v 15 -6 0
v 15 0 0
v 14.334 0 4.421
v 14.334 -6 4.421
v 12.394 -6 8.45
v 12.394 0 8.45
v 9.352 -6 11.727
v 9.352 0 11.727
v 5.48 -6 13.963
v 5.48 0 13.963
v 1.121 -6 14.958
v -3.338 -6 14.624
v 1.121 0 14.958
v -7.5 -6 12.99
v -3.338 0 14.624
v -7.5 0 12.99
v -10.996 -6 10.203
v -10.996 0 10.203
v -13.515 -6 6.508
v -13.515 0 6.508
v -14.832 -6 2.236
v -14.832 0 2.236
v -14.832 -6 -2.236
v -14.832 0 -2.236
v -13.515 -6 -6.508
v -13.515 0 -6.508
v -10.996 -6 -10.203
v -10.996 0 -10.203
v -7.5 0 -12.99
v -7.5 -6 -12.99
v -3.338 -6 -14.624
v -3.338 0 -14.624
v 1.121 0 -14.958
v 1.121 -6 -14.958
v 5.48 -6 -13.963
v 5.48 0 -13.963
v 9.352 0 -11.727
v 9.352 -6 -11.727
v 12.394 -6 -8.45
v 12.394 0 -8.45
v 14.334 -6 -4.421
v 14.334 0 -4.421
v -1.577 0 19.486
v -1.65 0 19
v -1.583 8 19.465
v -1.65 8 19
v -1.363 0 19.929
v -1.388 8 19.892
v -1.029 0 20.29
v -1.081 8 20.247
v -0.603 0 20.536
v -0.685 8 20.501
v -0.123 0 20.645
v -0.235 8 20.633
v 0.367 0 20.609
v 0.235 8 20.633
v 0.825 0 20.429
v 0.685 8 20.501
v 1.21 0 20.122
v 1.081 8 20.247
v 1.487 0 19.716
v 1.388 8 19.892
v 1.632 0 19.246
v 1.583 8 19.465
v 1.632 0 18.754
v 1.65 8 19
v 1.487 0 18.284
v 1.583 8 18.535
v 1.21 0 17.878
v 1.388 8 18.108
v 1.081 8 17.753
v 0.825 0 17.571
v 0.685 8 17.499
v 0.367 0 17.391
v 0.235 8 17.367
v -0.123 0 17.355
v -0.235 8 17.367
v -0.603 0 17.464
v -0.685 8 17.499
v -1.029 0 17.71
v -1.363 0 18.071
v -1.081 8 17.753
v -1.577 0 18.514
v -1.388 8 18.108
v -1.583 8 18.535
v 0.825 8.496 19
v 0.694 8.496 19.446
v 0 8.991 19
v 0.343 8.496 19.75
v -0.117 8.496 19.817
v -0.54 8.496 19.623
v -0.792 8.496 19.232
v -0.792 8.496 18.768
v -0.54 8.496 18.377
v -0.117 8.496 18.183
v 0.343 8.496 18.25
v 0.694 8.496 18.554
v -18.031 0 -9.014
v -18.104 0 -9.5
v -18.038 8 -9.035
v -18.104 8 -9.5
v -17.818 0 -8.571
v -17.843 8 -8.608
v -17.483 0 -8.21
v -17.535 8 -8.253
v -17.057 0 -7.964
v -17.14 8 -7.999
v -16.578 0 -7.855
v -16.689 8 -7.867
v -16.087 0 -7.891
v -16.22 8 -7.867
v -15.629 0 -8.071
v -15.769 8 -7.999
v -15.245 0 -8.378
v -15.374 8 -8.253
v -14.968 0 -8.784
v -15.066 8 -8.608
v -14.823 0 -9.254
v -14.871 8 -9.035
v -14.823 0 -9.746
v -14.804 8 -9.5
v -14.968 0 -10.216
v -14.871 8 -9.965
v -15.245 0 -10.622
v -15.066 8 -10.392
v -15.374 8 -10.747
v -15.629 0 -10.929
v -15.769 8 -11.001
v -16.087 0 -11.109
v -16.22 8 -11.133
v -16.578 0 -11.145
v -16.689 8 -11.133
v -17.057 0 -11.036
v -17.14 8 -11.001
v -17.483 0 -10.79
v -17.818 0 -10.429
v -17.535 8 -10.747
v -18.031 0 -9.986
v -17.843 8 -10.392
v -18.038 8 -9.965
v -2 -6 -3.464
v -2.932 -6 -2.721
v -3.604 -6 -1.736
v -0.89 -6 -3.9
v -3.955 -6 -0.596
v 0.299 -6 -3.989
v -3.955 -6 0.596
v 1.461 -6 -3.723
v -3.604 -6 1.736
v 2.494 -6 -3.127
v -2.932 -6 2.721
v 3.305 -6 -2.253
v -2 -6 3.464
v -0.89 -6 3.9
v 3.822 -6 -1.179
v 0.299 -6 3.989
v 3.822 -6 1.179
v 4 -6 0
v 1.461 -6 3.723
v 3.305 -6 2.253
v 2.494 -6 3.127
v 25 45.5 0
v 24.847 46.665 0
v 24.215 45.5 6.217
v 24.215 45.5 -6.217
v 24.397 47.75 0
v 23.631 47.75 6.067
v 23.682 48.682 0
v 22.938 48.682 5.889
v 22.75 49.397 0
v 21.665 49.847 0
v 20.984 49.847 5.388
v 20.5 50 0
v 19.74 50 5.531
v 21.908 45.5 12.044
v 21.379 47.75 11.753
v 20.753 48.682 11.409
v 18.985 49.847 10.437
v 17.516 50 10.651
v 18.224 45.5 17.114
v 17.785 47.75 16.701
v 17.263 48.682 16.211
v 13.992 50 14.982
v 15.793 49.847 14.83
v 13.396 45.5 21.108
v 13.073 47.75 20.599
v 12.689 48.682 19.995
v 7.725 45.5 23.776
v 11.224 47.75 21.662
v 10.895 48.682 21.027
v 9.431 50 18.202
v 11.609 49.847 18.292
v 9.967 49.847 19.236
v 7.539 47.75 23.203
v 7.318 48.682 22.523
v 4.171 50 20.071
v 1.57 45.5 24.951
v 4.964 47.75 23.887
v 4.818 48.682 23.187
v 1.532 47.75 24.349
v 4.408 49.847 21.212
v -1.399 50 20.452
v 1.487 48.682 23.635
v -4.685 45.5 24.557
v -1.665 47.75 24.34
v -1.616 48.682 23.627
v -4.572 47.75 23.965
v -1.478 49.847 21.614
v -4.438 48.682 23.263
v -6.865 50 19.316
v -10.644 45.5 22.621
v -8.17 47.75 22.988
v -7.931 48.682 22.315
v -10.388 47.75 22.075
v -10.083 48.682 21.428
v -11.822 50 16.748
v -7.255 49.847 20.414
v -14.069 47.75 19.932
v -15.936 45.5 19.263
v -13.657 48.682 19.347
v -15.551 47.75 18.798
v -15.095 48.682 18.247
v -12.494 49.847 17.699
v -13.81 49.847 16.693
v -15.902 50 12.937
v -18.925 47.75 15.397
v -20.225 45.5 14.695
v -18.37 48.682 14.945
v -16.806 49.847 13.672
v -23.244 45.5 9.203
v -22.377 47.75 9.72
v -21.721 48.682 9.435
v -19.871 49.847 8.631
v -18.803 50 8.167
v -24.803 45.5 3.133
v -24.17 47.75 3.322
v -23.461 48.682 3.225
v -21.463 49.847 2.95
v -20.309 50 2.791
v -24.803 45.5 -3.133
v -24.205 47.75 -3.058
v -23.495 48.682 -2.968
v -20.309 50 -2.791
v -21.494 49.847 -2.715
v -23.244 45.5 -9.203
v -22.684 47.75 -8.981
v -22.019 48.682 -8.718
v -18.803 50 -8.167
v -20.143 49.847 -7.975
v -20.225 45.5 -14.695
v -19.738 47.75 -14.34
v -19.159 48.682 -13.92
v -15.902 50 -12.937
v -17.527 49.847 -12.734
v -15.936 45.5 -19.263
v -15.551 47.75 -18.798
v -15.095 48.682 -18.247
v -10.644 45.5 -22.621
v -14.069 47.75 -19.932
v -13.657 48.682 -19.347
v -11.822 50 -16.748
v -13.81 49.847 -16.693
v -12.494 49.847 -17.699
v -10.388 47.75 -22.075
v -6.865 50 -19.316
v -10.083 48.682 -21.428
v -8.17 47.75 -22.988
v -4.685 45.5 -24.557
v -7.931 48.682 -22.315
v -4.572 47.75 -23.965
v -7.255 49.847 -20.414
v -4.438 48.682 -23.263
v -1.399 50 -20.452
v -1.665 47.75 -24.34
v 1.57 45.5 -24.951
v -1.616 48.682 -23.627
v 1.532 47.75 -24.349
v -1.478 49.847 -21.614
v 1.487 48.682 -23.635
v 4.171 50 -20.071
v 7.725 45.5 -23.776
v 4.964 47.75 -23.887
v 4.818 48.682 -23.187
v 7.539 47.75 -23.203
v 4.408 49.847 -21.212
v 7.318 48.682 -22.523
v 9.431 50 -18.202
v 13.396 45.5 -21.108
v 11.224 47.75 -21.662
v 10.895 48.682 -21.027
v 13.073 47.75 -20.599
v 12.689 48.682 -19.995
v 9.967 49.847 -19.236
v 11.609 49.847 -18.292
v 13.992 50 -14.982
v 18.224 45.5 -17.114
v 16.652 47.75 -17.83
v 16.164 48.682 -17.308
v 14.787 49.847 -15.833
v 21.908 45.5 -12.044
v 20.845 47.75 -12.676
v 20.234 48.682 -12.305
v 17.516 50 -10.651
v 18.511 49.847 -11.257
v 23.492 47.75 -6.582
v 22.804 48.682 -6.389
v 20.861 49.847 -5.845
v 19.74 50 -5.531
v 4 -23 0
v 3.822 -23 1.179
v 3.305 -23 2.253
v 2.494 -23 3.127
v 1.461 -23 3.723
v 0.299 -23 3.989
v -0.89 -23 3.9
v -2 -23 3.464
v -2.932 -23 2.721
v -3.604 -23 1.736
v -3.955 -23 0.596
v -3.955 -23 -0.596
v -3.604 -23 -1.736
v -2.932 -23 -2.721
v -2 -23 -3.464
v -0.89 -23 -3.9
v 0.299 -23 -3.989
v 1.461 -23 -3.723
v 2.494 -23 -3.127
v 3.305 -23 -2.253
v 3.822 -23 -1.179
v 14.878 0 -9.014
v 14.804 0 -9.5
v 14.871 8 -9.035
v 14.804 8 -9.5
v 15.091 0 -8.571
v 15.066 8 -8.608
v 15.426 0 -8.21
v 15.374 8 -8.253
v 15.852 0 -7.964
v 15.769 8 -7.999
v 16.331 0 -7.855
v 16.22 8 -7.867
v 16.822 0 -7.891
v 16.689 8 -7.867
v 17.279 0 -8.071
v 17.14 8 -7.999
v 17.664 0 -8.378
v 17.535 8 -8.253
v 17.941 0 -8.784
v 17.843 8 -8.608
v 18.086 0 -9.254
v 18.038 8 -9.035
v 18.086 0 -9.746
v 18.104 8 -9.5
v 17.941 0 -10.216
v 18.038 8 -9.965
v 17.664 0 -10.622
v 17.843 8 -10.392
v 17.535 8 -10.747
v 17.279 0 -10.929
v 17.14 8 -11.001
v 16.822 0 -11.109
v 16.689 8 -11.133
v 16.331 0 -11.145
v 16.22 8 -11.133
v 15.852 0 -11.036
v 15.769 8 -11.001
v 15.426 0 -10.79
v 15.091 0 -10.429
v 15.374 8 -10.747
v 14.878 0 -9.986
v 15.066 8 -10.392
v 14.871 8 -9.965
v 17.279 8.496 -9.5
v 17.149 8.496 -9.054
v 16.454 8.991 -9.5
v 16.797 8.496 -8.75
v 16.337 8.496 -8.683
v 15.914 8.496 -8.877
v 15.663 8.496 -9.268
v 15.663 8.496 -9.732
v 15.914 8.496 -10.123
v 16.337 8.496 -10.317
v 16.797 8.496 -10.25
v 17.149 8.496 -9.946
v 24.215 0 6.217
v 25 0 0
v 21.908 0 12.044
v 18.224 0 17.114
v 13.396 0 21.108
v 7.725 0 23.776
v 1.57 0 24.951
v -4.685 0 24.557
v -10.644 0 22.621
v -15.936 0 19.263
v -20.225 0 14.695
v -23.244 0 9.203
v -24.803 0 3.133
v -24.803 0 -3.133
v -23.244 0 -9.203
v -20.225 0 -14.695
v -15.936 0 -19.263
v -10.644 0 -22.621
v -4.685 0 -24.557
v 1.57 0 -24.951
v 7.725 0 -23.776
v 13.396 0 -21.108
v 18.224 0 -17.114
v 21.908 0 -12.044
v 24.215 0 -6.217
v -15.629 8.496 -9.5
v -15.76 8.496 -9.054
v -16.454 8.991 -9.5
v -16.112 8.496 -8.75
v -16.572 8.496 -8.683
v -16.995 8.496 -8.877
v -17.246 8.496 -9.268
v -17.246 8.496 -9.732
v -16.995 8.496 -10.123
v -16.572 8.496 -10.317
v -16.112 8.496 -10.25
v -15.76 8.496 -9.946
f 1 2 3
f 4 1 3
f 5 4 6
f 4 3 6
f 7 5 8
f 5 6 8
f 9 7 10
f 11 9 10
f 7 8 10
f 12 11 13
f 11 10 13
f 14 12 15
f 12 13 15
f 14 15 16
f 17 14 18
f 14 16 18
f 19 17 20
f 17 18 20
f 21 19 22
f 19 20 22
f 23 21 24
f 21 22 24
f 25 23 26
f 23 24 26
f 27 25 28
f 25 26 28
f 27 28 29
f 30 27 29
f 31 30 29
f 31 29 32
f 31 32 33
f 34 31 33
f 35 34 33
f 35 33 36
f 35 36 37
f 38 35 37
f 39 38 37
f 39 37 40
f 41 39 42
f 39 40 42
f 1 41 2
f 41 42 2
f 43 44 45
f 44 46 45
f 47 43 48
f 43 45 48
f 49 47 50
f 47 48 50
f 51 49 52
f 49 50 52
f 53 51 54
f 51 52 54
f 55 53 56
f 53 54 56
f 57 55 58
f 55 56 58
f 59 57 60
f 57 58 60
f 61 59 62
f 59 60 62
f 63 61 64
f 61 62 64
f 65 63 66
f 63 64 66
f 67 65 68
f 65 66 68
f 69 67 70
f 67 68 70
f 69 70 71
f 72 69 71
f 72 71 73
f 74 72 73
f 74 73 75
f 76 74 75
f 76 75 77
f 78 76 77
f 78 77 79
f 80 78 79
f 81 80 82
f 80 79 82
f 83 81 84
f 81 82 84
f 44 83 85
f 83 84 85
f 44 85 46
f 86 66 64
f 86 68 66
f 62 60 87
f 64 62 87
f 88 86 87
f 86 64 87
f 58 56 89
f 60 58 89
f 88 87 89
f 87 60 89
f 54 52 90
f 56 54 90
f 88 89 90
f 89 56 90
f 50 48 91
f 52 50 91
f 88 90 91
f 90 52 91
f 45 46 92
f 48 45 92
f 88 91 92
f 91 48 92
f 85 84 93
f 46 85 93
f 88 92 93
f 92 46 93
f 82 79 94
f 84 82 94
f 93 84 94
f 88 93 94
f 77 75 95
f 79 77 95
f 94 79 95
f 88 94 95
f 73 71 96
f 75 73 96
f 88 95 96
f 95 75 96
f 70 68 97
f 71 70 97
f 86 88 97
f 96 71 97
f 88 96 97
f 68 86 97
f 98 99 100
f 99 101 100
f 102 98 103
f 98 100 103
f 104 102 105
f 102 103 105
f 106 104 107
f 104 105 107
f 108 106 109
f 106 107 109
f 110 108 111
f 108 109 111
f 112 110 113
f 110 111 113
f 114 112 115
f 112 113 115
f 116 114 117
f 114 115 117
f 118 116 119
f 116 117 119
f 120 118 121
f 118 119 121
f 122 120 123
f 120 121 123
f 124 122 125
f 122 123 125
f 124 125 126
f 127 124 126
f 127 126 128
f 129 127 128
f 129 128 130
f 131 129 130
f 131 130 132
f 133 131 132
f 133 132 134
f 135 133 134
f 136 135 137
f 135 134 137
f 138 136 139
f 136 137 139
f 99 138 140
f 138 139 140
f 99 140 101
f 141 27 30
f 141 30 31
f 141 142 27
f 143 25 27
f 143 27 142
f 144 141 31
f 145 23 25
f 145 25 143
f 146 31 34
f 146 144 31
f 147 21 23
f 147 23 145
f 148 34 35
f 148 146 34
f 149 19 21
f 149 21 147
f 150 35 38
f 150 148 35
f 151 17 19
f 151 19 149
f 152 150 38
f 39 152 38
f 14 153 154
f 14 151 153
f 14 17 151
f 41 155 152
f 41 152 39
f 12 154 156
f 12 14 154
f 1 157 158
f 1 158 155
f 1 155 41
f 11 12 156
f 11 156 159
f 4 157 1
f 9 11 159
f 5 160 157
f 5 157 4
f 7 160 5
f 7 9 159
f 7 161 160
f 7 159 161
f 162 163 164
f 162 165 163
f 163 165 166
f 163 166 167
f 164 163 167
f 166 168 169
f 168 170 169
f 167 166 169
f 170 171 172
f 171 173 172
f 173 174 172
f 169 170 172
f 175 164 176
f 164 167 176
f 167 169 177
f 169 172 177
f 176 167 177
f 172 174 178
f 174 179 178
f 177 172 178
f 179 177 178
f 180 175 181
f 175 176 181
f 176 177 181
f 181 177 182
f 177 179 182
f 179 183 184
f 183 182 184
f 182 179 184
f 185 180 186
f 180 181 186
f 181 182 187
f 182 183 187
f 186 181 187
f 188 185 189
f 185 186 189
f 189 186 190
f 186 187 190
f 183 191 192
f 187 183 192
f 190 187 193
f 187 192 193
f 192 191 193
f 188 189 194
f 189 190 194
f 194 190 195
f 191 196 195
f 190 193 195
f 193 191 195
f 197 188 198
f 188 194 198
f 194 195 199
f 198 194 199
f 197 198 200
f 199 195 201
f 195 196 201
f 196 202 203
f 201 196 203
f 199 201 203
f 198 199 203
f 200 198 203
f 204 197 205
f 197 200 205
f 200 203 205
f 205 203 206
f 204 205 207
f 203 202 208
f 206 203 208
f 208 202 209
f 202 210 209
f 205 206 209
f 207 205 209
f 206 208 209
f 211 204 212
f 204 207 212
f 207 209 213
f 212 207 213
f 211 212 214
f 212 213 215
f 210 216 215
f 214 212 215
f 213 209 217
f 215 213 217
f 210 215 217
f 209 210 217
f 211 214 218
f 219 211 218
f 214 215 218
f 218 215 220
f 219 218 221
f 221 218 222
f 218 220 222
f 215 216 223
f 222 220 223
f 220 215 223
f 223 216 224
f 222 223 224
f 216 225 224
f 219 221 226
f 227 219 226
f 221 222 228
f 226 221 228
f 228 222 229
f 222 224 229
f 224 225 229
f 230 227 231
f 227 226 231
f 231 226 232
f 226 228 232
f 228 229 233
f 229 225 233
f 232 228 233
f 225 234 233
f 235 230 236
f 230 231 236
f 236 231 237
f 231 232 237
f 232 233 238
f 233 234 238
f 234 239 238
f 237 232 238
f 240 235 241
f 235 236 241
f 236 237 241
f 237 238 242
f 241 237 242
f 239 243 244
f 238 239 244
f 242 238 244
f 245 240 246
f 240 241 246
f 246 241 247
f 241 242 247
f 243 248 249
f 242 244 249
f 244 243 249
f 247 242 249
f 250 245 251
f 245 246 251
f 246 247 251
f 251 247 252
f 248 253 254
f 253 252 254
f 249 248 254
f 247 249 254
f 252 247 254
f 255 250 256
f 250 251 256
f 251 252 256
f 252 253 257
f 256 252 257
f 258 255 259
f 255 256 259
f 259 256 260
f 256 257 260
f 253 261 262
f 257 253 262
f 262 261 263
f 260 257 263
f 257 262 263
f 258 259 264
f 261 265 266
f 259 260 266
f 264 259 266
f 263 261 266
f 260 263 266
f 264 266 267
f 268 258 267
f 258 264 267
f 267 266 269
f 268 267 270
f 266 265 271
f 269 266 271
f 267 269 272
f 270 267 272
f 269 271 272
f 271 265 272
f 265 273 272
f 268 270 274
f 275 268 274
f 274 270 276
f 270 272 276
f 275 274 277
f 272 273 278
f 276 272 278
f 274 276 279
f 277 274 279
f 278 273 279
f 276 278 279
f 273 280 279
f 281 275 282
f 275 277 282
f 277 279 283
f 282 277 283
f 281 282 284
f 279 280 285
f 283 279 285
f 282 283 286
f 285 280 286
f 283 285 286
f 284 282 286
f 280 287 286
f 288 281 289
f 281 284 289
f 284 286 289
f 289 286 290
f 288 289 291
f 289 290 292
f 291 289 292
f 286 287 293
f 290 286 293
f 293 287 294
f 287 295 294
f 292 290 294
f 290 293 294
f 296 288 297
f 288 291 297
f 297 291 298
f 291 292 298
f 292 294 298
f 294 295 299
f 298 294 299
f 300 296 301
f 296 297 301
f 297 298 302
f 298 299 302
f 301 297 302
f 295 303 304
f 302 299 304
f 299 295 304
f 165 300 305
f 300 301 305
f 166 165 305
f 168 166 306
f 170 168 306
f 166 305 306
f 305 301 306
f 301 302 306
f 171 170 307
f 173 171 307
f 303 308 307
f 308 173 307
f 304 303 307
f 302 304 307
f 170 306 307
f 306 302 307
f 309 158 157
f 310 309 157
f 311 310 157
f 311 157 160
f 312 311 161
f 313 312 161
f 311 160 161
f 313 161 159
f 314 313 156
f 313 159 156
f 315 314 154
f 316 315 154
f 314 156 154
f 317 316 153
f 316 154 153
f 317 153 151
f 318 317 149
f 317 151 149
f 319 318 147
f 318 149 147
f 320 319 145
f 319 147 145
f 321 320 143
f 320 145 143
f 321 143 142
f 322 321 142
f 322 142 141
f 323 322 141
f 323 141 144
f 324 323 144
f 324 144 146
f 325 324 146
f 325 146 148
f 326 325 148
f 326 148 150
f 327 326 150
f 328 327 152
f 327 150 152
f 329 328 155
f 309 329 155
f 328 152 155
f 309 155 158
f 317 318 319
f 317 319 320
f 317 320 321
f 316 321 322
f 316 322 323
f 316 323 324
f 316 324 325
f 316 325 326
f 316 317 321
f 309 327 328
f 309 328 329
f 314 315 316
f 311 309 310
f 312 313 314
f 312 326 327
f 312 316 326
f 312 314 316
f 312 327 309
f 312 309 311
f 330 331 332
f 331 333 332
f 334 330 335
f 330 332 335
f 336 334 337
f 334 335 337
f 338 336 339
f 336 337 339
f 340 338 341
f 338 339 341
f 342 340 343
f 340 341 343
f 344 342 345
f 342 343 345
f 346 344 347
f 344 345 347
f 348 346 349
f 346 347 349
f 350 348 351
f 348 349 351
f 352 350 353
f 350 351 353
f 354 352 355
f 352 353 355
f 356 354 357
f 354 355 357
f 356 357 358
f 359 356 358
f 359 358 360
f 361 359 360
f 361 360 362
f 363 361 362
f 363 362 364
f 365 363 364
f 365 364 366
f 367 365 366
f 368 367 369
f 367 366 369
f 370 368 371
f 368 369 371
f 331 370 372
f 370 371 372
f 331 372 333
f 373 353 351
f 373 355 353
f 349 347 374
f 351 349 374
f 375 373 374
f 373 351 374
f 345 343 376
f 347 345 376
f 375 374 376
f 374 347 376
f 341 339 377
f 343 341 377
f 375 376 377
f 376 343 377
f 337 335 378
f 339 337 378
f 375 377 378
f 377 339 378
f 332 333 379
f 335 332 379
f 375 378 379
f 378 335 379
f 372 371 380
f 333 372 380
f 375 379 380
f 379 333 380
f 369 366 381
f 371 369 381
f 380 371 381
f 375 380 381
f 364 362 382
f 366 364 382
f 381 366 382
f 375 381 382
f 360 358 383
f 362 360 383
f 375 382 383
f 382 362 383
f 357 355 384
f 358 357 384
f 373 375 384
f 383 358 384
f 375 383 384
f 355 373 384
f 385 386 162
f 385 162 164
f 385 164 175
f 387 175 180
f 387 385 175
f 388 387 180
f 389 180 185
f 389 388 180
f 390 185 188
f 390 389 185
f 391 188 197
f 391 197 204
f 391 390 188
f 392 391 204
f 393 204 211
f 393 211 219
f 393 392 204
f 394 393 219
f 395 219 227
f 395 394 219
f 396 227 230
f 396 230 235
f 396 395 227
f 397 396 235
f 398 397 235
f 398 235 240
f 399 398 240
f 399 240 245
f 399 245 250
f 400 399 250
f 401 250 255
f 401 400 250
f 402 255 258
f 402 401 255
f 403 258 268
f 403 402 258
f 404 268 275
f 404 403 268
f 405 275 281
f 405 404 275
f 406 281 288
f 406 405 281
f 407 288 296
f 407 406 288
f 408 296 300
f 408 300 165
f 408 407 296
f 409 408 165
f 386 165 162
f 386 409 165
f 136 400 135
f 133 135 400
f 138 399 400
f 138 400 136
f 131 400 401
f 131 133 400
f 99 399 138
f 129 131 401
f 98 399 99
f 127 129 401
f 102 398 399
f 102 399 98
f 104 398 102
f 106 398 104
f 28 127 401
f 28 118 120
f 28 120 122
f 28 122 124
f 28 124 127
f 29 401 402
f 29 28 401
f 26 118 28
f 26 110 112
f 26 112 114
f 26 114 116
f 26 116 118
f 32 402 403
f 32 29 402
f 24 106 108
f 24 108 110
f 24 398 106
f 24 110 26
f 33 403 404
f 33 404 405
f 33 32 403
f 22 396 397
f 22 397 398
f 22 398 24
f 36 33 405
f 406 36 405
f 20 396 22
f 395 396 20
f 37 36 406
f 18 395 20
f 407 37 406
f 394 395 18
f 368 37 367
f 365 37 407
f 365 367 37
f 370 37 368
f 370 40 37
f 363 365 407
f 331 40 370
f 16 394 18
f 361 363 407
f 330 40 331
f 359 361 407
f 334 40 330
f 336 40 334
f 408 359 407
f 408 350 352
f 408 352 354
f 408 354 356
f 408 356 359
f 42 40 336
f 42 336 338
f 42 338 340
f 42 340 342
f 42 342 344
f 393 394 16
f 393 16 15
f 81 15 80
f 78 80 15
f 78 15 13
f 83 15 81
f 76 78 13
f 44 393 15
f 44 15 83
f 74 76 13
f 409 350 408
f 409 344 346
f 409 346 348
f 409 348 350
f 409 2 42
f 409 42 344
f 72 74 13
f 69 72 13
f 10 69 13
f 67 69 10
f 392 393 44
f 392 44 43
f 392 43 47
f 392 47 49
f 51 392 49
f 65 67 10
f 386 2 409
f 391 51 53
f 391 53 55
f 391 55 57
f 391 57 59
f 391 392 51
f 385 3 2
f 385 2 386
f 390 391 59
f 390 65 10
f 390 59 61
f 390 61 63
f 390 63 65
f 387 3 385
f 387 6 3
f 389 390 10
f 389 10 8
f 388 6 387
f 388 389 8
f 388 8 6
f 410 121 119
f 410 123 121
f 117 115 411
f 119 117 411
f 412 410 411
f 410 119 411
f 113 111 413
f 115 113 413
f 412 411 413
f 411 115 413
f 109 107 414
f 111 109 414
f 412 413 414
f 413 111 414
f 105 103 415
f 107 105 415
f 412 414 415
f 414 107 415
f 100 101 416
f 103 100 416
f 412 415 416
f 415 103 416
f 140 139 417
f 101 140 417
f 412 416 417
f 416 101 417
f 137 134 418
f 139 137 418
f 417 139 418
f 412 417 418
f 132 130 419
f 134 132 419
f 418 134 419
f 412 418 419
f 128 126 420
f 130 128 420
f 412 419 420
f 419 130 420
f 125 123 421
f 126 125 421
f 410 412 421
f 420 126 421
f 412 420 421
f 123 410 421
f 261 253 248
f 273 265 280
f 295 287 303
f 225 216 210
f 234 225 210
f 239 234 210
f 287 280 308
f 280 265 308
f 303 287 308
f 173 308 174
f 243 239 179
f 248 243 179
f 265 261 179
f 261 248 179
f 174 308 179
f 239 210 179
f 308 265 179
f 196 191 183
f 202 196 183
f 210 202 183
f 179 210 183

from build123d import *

# Parameters (mm, degrees)
F0_R     = 25
F1_DEPTH = 50
F2_R     = 4.5
F3_R     = 15
F4_DEPTH = 6
F5_D     = 3.3
F5_DEPTH = 8
F5_TIP   = 0.9914200214
F6_R     = 4
F7_DEPTH = 17


with BuildPart() as f1:
    # F0 (on Front) → F1 (new body)
    with BuildSketch(Plane.XZ):
        Circle(F0_R)
    extrude(amount=-F1_DEPTH)

    # F2
    f2_edges = [f1.edges().sort_by_distance(p)[0] for p in [
        (-25, 50, 0),
    ]]
    fillet(f2_edges, radius=F2_R)

    # F3 (on face) → F4 (join)
    with BuildSketch(Plane.XZ):
        Circle(F3_R)
    extrude(amount=F4_DEPTH)

    # F5
    with Locations(Plane.XZ):
        with Locations((0, 19), (-16.4544826719, -9.5), (16.4544826719, -9.5)):
            Hole(F5_D / 2, depth=F5_DEPTH)
            with Locations((0, 0, -(F5_DEPTH + F5_TIP / 2))):  # 118° drill point
                Cone(0, F5_D / 2, F5_TIP, mode=Mode.SUBTRACT)

    # F6 (on face) → F7 (join)
    with BuildSketch(Plane.XZ.offset(6)):
        Circle(F6_R)
    extrude(amount=F7_DEPTH)


solid = f1.part
